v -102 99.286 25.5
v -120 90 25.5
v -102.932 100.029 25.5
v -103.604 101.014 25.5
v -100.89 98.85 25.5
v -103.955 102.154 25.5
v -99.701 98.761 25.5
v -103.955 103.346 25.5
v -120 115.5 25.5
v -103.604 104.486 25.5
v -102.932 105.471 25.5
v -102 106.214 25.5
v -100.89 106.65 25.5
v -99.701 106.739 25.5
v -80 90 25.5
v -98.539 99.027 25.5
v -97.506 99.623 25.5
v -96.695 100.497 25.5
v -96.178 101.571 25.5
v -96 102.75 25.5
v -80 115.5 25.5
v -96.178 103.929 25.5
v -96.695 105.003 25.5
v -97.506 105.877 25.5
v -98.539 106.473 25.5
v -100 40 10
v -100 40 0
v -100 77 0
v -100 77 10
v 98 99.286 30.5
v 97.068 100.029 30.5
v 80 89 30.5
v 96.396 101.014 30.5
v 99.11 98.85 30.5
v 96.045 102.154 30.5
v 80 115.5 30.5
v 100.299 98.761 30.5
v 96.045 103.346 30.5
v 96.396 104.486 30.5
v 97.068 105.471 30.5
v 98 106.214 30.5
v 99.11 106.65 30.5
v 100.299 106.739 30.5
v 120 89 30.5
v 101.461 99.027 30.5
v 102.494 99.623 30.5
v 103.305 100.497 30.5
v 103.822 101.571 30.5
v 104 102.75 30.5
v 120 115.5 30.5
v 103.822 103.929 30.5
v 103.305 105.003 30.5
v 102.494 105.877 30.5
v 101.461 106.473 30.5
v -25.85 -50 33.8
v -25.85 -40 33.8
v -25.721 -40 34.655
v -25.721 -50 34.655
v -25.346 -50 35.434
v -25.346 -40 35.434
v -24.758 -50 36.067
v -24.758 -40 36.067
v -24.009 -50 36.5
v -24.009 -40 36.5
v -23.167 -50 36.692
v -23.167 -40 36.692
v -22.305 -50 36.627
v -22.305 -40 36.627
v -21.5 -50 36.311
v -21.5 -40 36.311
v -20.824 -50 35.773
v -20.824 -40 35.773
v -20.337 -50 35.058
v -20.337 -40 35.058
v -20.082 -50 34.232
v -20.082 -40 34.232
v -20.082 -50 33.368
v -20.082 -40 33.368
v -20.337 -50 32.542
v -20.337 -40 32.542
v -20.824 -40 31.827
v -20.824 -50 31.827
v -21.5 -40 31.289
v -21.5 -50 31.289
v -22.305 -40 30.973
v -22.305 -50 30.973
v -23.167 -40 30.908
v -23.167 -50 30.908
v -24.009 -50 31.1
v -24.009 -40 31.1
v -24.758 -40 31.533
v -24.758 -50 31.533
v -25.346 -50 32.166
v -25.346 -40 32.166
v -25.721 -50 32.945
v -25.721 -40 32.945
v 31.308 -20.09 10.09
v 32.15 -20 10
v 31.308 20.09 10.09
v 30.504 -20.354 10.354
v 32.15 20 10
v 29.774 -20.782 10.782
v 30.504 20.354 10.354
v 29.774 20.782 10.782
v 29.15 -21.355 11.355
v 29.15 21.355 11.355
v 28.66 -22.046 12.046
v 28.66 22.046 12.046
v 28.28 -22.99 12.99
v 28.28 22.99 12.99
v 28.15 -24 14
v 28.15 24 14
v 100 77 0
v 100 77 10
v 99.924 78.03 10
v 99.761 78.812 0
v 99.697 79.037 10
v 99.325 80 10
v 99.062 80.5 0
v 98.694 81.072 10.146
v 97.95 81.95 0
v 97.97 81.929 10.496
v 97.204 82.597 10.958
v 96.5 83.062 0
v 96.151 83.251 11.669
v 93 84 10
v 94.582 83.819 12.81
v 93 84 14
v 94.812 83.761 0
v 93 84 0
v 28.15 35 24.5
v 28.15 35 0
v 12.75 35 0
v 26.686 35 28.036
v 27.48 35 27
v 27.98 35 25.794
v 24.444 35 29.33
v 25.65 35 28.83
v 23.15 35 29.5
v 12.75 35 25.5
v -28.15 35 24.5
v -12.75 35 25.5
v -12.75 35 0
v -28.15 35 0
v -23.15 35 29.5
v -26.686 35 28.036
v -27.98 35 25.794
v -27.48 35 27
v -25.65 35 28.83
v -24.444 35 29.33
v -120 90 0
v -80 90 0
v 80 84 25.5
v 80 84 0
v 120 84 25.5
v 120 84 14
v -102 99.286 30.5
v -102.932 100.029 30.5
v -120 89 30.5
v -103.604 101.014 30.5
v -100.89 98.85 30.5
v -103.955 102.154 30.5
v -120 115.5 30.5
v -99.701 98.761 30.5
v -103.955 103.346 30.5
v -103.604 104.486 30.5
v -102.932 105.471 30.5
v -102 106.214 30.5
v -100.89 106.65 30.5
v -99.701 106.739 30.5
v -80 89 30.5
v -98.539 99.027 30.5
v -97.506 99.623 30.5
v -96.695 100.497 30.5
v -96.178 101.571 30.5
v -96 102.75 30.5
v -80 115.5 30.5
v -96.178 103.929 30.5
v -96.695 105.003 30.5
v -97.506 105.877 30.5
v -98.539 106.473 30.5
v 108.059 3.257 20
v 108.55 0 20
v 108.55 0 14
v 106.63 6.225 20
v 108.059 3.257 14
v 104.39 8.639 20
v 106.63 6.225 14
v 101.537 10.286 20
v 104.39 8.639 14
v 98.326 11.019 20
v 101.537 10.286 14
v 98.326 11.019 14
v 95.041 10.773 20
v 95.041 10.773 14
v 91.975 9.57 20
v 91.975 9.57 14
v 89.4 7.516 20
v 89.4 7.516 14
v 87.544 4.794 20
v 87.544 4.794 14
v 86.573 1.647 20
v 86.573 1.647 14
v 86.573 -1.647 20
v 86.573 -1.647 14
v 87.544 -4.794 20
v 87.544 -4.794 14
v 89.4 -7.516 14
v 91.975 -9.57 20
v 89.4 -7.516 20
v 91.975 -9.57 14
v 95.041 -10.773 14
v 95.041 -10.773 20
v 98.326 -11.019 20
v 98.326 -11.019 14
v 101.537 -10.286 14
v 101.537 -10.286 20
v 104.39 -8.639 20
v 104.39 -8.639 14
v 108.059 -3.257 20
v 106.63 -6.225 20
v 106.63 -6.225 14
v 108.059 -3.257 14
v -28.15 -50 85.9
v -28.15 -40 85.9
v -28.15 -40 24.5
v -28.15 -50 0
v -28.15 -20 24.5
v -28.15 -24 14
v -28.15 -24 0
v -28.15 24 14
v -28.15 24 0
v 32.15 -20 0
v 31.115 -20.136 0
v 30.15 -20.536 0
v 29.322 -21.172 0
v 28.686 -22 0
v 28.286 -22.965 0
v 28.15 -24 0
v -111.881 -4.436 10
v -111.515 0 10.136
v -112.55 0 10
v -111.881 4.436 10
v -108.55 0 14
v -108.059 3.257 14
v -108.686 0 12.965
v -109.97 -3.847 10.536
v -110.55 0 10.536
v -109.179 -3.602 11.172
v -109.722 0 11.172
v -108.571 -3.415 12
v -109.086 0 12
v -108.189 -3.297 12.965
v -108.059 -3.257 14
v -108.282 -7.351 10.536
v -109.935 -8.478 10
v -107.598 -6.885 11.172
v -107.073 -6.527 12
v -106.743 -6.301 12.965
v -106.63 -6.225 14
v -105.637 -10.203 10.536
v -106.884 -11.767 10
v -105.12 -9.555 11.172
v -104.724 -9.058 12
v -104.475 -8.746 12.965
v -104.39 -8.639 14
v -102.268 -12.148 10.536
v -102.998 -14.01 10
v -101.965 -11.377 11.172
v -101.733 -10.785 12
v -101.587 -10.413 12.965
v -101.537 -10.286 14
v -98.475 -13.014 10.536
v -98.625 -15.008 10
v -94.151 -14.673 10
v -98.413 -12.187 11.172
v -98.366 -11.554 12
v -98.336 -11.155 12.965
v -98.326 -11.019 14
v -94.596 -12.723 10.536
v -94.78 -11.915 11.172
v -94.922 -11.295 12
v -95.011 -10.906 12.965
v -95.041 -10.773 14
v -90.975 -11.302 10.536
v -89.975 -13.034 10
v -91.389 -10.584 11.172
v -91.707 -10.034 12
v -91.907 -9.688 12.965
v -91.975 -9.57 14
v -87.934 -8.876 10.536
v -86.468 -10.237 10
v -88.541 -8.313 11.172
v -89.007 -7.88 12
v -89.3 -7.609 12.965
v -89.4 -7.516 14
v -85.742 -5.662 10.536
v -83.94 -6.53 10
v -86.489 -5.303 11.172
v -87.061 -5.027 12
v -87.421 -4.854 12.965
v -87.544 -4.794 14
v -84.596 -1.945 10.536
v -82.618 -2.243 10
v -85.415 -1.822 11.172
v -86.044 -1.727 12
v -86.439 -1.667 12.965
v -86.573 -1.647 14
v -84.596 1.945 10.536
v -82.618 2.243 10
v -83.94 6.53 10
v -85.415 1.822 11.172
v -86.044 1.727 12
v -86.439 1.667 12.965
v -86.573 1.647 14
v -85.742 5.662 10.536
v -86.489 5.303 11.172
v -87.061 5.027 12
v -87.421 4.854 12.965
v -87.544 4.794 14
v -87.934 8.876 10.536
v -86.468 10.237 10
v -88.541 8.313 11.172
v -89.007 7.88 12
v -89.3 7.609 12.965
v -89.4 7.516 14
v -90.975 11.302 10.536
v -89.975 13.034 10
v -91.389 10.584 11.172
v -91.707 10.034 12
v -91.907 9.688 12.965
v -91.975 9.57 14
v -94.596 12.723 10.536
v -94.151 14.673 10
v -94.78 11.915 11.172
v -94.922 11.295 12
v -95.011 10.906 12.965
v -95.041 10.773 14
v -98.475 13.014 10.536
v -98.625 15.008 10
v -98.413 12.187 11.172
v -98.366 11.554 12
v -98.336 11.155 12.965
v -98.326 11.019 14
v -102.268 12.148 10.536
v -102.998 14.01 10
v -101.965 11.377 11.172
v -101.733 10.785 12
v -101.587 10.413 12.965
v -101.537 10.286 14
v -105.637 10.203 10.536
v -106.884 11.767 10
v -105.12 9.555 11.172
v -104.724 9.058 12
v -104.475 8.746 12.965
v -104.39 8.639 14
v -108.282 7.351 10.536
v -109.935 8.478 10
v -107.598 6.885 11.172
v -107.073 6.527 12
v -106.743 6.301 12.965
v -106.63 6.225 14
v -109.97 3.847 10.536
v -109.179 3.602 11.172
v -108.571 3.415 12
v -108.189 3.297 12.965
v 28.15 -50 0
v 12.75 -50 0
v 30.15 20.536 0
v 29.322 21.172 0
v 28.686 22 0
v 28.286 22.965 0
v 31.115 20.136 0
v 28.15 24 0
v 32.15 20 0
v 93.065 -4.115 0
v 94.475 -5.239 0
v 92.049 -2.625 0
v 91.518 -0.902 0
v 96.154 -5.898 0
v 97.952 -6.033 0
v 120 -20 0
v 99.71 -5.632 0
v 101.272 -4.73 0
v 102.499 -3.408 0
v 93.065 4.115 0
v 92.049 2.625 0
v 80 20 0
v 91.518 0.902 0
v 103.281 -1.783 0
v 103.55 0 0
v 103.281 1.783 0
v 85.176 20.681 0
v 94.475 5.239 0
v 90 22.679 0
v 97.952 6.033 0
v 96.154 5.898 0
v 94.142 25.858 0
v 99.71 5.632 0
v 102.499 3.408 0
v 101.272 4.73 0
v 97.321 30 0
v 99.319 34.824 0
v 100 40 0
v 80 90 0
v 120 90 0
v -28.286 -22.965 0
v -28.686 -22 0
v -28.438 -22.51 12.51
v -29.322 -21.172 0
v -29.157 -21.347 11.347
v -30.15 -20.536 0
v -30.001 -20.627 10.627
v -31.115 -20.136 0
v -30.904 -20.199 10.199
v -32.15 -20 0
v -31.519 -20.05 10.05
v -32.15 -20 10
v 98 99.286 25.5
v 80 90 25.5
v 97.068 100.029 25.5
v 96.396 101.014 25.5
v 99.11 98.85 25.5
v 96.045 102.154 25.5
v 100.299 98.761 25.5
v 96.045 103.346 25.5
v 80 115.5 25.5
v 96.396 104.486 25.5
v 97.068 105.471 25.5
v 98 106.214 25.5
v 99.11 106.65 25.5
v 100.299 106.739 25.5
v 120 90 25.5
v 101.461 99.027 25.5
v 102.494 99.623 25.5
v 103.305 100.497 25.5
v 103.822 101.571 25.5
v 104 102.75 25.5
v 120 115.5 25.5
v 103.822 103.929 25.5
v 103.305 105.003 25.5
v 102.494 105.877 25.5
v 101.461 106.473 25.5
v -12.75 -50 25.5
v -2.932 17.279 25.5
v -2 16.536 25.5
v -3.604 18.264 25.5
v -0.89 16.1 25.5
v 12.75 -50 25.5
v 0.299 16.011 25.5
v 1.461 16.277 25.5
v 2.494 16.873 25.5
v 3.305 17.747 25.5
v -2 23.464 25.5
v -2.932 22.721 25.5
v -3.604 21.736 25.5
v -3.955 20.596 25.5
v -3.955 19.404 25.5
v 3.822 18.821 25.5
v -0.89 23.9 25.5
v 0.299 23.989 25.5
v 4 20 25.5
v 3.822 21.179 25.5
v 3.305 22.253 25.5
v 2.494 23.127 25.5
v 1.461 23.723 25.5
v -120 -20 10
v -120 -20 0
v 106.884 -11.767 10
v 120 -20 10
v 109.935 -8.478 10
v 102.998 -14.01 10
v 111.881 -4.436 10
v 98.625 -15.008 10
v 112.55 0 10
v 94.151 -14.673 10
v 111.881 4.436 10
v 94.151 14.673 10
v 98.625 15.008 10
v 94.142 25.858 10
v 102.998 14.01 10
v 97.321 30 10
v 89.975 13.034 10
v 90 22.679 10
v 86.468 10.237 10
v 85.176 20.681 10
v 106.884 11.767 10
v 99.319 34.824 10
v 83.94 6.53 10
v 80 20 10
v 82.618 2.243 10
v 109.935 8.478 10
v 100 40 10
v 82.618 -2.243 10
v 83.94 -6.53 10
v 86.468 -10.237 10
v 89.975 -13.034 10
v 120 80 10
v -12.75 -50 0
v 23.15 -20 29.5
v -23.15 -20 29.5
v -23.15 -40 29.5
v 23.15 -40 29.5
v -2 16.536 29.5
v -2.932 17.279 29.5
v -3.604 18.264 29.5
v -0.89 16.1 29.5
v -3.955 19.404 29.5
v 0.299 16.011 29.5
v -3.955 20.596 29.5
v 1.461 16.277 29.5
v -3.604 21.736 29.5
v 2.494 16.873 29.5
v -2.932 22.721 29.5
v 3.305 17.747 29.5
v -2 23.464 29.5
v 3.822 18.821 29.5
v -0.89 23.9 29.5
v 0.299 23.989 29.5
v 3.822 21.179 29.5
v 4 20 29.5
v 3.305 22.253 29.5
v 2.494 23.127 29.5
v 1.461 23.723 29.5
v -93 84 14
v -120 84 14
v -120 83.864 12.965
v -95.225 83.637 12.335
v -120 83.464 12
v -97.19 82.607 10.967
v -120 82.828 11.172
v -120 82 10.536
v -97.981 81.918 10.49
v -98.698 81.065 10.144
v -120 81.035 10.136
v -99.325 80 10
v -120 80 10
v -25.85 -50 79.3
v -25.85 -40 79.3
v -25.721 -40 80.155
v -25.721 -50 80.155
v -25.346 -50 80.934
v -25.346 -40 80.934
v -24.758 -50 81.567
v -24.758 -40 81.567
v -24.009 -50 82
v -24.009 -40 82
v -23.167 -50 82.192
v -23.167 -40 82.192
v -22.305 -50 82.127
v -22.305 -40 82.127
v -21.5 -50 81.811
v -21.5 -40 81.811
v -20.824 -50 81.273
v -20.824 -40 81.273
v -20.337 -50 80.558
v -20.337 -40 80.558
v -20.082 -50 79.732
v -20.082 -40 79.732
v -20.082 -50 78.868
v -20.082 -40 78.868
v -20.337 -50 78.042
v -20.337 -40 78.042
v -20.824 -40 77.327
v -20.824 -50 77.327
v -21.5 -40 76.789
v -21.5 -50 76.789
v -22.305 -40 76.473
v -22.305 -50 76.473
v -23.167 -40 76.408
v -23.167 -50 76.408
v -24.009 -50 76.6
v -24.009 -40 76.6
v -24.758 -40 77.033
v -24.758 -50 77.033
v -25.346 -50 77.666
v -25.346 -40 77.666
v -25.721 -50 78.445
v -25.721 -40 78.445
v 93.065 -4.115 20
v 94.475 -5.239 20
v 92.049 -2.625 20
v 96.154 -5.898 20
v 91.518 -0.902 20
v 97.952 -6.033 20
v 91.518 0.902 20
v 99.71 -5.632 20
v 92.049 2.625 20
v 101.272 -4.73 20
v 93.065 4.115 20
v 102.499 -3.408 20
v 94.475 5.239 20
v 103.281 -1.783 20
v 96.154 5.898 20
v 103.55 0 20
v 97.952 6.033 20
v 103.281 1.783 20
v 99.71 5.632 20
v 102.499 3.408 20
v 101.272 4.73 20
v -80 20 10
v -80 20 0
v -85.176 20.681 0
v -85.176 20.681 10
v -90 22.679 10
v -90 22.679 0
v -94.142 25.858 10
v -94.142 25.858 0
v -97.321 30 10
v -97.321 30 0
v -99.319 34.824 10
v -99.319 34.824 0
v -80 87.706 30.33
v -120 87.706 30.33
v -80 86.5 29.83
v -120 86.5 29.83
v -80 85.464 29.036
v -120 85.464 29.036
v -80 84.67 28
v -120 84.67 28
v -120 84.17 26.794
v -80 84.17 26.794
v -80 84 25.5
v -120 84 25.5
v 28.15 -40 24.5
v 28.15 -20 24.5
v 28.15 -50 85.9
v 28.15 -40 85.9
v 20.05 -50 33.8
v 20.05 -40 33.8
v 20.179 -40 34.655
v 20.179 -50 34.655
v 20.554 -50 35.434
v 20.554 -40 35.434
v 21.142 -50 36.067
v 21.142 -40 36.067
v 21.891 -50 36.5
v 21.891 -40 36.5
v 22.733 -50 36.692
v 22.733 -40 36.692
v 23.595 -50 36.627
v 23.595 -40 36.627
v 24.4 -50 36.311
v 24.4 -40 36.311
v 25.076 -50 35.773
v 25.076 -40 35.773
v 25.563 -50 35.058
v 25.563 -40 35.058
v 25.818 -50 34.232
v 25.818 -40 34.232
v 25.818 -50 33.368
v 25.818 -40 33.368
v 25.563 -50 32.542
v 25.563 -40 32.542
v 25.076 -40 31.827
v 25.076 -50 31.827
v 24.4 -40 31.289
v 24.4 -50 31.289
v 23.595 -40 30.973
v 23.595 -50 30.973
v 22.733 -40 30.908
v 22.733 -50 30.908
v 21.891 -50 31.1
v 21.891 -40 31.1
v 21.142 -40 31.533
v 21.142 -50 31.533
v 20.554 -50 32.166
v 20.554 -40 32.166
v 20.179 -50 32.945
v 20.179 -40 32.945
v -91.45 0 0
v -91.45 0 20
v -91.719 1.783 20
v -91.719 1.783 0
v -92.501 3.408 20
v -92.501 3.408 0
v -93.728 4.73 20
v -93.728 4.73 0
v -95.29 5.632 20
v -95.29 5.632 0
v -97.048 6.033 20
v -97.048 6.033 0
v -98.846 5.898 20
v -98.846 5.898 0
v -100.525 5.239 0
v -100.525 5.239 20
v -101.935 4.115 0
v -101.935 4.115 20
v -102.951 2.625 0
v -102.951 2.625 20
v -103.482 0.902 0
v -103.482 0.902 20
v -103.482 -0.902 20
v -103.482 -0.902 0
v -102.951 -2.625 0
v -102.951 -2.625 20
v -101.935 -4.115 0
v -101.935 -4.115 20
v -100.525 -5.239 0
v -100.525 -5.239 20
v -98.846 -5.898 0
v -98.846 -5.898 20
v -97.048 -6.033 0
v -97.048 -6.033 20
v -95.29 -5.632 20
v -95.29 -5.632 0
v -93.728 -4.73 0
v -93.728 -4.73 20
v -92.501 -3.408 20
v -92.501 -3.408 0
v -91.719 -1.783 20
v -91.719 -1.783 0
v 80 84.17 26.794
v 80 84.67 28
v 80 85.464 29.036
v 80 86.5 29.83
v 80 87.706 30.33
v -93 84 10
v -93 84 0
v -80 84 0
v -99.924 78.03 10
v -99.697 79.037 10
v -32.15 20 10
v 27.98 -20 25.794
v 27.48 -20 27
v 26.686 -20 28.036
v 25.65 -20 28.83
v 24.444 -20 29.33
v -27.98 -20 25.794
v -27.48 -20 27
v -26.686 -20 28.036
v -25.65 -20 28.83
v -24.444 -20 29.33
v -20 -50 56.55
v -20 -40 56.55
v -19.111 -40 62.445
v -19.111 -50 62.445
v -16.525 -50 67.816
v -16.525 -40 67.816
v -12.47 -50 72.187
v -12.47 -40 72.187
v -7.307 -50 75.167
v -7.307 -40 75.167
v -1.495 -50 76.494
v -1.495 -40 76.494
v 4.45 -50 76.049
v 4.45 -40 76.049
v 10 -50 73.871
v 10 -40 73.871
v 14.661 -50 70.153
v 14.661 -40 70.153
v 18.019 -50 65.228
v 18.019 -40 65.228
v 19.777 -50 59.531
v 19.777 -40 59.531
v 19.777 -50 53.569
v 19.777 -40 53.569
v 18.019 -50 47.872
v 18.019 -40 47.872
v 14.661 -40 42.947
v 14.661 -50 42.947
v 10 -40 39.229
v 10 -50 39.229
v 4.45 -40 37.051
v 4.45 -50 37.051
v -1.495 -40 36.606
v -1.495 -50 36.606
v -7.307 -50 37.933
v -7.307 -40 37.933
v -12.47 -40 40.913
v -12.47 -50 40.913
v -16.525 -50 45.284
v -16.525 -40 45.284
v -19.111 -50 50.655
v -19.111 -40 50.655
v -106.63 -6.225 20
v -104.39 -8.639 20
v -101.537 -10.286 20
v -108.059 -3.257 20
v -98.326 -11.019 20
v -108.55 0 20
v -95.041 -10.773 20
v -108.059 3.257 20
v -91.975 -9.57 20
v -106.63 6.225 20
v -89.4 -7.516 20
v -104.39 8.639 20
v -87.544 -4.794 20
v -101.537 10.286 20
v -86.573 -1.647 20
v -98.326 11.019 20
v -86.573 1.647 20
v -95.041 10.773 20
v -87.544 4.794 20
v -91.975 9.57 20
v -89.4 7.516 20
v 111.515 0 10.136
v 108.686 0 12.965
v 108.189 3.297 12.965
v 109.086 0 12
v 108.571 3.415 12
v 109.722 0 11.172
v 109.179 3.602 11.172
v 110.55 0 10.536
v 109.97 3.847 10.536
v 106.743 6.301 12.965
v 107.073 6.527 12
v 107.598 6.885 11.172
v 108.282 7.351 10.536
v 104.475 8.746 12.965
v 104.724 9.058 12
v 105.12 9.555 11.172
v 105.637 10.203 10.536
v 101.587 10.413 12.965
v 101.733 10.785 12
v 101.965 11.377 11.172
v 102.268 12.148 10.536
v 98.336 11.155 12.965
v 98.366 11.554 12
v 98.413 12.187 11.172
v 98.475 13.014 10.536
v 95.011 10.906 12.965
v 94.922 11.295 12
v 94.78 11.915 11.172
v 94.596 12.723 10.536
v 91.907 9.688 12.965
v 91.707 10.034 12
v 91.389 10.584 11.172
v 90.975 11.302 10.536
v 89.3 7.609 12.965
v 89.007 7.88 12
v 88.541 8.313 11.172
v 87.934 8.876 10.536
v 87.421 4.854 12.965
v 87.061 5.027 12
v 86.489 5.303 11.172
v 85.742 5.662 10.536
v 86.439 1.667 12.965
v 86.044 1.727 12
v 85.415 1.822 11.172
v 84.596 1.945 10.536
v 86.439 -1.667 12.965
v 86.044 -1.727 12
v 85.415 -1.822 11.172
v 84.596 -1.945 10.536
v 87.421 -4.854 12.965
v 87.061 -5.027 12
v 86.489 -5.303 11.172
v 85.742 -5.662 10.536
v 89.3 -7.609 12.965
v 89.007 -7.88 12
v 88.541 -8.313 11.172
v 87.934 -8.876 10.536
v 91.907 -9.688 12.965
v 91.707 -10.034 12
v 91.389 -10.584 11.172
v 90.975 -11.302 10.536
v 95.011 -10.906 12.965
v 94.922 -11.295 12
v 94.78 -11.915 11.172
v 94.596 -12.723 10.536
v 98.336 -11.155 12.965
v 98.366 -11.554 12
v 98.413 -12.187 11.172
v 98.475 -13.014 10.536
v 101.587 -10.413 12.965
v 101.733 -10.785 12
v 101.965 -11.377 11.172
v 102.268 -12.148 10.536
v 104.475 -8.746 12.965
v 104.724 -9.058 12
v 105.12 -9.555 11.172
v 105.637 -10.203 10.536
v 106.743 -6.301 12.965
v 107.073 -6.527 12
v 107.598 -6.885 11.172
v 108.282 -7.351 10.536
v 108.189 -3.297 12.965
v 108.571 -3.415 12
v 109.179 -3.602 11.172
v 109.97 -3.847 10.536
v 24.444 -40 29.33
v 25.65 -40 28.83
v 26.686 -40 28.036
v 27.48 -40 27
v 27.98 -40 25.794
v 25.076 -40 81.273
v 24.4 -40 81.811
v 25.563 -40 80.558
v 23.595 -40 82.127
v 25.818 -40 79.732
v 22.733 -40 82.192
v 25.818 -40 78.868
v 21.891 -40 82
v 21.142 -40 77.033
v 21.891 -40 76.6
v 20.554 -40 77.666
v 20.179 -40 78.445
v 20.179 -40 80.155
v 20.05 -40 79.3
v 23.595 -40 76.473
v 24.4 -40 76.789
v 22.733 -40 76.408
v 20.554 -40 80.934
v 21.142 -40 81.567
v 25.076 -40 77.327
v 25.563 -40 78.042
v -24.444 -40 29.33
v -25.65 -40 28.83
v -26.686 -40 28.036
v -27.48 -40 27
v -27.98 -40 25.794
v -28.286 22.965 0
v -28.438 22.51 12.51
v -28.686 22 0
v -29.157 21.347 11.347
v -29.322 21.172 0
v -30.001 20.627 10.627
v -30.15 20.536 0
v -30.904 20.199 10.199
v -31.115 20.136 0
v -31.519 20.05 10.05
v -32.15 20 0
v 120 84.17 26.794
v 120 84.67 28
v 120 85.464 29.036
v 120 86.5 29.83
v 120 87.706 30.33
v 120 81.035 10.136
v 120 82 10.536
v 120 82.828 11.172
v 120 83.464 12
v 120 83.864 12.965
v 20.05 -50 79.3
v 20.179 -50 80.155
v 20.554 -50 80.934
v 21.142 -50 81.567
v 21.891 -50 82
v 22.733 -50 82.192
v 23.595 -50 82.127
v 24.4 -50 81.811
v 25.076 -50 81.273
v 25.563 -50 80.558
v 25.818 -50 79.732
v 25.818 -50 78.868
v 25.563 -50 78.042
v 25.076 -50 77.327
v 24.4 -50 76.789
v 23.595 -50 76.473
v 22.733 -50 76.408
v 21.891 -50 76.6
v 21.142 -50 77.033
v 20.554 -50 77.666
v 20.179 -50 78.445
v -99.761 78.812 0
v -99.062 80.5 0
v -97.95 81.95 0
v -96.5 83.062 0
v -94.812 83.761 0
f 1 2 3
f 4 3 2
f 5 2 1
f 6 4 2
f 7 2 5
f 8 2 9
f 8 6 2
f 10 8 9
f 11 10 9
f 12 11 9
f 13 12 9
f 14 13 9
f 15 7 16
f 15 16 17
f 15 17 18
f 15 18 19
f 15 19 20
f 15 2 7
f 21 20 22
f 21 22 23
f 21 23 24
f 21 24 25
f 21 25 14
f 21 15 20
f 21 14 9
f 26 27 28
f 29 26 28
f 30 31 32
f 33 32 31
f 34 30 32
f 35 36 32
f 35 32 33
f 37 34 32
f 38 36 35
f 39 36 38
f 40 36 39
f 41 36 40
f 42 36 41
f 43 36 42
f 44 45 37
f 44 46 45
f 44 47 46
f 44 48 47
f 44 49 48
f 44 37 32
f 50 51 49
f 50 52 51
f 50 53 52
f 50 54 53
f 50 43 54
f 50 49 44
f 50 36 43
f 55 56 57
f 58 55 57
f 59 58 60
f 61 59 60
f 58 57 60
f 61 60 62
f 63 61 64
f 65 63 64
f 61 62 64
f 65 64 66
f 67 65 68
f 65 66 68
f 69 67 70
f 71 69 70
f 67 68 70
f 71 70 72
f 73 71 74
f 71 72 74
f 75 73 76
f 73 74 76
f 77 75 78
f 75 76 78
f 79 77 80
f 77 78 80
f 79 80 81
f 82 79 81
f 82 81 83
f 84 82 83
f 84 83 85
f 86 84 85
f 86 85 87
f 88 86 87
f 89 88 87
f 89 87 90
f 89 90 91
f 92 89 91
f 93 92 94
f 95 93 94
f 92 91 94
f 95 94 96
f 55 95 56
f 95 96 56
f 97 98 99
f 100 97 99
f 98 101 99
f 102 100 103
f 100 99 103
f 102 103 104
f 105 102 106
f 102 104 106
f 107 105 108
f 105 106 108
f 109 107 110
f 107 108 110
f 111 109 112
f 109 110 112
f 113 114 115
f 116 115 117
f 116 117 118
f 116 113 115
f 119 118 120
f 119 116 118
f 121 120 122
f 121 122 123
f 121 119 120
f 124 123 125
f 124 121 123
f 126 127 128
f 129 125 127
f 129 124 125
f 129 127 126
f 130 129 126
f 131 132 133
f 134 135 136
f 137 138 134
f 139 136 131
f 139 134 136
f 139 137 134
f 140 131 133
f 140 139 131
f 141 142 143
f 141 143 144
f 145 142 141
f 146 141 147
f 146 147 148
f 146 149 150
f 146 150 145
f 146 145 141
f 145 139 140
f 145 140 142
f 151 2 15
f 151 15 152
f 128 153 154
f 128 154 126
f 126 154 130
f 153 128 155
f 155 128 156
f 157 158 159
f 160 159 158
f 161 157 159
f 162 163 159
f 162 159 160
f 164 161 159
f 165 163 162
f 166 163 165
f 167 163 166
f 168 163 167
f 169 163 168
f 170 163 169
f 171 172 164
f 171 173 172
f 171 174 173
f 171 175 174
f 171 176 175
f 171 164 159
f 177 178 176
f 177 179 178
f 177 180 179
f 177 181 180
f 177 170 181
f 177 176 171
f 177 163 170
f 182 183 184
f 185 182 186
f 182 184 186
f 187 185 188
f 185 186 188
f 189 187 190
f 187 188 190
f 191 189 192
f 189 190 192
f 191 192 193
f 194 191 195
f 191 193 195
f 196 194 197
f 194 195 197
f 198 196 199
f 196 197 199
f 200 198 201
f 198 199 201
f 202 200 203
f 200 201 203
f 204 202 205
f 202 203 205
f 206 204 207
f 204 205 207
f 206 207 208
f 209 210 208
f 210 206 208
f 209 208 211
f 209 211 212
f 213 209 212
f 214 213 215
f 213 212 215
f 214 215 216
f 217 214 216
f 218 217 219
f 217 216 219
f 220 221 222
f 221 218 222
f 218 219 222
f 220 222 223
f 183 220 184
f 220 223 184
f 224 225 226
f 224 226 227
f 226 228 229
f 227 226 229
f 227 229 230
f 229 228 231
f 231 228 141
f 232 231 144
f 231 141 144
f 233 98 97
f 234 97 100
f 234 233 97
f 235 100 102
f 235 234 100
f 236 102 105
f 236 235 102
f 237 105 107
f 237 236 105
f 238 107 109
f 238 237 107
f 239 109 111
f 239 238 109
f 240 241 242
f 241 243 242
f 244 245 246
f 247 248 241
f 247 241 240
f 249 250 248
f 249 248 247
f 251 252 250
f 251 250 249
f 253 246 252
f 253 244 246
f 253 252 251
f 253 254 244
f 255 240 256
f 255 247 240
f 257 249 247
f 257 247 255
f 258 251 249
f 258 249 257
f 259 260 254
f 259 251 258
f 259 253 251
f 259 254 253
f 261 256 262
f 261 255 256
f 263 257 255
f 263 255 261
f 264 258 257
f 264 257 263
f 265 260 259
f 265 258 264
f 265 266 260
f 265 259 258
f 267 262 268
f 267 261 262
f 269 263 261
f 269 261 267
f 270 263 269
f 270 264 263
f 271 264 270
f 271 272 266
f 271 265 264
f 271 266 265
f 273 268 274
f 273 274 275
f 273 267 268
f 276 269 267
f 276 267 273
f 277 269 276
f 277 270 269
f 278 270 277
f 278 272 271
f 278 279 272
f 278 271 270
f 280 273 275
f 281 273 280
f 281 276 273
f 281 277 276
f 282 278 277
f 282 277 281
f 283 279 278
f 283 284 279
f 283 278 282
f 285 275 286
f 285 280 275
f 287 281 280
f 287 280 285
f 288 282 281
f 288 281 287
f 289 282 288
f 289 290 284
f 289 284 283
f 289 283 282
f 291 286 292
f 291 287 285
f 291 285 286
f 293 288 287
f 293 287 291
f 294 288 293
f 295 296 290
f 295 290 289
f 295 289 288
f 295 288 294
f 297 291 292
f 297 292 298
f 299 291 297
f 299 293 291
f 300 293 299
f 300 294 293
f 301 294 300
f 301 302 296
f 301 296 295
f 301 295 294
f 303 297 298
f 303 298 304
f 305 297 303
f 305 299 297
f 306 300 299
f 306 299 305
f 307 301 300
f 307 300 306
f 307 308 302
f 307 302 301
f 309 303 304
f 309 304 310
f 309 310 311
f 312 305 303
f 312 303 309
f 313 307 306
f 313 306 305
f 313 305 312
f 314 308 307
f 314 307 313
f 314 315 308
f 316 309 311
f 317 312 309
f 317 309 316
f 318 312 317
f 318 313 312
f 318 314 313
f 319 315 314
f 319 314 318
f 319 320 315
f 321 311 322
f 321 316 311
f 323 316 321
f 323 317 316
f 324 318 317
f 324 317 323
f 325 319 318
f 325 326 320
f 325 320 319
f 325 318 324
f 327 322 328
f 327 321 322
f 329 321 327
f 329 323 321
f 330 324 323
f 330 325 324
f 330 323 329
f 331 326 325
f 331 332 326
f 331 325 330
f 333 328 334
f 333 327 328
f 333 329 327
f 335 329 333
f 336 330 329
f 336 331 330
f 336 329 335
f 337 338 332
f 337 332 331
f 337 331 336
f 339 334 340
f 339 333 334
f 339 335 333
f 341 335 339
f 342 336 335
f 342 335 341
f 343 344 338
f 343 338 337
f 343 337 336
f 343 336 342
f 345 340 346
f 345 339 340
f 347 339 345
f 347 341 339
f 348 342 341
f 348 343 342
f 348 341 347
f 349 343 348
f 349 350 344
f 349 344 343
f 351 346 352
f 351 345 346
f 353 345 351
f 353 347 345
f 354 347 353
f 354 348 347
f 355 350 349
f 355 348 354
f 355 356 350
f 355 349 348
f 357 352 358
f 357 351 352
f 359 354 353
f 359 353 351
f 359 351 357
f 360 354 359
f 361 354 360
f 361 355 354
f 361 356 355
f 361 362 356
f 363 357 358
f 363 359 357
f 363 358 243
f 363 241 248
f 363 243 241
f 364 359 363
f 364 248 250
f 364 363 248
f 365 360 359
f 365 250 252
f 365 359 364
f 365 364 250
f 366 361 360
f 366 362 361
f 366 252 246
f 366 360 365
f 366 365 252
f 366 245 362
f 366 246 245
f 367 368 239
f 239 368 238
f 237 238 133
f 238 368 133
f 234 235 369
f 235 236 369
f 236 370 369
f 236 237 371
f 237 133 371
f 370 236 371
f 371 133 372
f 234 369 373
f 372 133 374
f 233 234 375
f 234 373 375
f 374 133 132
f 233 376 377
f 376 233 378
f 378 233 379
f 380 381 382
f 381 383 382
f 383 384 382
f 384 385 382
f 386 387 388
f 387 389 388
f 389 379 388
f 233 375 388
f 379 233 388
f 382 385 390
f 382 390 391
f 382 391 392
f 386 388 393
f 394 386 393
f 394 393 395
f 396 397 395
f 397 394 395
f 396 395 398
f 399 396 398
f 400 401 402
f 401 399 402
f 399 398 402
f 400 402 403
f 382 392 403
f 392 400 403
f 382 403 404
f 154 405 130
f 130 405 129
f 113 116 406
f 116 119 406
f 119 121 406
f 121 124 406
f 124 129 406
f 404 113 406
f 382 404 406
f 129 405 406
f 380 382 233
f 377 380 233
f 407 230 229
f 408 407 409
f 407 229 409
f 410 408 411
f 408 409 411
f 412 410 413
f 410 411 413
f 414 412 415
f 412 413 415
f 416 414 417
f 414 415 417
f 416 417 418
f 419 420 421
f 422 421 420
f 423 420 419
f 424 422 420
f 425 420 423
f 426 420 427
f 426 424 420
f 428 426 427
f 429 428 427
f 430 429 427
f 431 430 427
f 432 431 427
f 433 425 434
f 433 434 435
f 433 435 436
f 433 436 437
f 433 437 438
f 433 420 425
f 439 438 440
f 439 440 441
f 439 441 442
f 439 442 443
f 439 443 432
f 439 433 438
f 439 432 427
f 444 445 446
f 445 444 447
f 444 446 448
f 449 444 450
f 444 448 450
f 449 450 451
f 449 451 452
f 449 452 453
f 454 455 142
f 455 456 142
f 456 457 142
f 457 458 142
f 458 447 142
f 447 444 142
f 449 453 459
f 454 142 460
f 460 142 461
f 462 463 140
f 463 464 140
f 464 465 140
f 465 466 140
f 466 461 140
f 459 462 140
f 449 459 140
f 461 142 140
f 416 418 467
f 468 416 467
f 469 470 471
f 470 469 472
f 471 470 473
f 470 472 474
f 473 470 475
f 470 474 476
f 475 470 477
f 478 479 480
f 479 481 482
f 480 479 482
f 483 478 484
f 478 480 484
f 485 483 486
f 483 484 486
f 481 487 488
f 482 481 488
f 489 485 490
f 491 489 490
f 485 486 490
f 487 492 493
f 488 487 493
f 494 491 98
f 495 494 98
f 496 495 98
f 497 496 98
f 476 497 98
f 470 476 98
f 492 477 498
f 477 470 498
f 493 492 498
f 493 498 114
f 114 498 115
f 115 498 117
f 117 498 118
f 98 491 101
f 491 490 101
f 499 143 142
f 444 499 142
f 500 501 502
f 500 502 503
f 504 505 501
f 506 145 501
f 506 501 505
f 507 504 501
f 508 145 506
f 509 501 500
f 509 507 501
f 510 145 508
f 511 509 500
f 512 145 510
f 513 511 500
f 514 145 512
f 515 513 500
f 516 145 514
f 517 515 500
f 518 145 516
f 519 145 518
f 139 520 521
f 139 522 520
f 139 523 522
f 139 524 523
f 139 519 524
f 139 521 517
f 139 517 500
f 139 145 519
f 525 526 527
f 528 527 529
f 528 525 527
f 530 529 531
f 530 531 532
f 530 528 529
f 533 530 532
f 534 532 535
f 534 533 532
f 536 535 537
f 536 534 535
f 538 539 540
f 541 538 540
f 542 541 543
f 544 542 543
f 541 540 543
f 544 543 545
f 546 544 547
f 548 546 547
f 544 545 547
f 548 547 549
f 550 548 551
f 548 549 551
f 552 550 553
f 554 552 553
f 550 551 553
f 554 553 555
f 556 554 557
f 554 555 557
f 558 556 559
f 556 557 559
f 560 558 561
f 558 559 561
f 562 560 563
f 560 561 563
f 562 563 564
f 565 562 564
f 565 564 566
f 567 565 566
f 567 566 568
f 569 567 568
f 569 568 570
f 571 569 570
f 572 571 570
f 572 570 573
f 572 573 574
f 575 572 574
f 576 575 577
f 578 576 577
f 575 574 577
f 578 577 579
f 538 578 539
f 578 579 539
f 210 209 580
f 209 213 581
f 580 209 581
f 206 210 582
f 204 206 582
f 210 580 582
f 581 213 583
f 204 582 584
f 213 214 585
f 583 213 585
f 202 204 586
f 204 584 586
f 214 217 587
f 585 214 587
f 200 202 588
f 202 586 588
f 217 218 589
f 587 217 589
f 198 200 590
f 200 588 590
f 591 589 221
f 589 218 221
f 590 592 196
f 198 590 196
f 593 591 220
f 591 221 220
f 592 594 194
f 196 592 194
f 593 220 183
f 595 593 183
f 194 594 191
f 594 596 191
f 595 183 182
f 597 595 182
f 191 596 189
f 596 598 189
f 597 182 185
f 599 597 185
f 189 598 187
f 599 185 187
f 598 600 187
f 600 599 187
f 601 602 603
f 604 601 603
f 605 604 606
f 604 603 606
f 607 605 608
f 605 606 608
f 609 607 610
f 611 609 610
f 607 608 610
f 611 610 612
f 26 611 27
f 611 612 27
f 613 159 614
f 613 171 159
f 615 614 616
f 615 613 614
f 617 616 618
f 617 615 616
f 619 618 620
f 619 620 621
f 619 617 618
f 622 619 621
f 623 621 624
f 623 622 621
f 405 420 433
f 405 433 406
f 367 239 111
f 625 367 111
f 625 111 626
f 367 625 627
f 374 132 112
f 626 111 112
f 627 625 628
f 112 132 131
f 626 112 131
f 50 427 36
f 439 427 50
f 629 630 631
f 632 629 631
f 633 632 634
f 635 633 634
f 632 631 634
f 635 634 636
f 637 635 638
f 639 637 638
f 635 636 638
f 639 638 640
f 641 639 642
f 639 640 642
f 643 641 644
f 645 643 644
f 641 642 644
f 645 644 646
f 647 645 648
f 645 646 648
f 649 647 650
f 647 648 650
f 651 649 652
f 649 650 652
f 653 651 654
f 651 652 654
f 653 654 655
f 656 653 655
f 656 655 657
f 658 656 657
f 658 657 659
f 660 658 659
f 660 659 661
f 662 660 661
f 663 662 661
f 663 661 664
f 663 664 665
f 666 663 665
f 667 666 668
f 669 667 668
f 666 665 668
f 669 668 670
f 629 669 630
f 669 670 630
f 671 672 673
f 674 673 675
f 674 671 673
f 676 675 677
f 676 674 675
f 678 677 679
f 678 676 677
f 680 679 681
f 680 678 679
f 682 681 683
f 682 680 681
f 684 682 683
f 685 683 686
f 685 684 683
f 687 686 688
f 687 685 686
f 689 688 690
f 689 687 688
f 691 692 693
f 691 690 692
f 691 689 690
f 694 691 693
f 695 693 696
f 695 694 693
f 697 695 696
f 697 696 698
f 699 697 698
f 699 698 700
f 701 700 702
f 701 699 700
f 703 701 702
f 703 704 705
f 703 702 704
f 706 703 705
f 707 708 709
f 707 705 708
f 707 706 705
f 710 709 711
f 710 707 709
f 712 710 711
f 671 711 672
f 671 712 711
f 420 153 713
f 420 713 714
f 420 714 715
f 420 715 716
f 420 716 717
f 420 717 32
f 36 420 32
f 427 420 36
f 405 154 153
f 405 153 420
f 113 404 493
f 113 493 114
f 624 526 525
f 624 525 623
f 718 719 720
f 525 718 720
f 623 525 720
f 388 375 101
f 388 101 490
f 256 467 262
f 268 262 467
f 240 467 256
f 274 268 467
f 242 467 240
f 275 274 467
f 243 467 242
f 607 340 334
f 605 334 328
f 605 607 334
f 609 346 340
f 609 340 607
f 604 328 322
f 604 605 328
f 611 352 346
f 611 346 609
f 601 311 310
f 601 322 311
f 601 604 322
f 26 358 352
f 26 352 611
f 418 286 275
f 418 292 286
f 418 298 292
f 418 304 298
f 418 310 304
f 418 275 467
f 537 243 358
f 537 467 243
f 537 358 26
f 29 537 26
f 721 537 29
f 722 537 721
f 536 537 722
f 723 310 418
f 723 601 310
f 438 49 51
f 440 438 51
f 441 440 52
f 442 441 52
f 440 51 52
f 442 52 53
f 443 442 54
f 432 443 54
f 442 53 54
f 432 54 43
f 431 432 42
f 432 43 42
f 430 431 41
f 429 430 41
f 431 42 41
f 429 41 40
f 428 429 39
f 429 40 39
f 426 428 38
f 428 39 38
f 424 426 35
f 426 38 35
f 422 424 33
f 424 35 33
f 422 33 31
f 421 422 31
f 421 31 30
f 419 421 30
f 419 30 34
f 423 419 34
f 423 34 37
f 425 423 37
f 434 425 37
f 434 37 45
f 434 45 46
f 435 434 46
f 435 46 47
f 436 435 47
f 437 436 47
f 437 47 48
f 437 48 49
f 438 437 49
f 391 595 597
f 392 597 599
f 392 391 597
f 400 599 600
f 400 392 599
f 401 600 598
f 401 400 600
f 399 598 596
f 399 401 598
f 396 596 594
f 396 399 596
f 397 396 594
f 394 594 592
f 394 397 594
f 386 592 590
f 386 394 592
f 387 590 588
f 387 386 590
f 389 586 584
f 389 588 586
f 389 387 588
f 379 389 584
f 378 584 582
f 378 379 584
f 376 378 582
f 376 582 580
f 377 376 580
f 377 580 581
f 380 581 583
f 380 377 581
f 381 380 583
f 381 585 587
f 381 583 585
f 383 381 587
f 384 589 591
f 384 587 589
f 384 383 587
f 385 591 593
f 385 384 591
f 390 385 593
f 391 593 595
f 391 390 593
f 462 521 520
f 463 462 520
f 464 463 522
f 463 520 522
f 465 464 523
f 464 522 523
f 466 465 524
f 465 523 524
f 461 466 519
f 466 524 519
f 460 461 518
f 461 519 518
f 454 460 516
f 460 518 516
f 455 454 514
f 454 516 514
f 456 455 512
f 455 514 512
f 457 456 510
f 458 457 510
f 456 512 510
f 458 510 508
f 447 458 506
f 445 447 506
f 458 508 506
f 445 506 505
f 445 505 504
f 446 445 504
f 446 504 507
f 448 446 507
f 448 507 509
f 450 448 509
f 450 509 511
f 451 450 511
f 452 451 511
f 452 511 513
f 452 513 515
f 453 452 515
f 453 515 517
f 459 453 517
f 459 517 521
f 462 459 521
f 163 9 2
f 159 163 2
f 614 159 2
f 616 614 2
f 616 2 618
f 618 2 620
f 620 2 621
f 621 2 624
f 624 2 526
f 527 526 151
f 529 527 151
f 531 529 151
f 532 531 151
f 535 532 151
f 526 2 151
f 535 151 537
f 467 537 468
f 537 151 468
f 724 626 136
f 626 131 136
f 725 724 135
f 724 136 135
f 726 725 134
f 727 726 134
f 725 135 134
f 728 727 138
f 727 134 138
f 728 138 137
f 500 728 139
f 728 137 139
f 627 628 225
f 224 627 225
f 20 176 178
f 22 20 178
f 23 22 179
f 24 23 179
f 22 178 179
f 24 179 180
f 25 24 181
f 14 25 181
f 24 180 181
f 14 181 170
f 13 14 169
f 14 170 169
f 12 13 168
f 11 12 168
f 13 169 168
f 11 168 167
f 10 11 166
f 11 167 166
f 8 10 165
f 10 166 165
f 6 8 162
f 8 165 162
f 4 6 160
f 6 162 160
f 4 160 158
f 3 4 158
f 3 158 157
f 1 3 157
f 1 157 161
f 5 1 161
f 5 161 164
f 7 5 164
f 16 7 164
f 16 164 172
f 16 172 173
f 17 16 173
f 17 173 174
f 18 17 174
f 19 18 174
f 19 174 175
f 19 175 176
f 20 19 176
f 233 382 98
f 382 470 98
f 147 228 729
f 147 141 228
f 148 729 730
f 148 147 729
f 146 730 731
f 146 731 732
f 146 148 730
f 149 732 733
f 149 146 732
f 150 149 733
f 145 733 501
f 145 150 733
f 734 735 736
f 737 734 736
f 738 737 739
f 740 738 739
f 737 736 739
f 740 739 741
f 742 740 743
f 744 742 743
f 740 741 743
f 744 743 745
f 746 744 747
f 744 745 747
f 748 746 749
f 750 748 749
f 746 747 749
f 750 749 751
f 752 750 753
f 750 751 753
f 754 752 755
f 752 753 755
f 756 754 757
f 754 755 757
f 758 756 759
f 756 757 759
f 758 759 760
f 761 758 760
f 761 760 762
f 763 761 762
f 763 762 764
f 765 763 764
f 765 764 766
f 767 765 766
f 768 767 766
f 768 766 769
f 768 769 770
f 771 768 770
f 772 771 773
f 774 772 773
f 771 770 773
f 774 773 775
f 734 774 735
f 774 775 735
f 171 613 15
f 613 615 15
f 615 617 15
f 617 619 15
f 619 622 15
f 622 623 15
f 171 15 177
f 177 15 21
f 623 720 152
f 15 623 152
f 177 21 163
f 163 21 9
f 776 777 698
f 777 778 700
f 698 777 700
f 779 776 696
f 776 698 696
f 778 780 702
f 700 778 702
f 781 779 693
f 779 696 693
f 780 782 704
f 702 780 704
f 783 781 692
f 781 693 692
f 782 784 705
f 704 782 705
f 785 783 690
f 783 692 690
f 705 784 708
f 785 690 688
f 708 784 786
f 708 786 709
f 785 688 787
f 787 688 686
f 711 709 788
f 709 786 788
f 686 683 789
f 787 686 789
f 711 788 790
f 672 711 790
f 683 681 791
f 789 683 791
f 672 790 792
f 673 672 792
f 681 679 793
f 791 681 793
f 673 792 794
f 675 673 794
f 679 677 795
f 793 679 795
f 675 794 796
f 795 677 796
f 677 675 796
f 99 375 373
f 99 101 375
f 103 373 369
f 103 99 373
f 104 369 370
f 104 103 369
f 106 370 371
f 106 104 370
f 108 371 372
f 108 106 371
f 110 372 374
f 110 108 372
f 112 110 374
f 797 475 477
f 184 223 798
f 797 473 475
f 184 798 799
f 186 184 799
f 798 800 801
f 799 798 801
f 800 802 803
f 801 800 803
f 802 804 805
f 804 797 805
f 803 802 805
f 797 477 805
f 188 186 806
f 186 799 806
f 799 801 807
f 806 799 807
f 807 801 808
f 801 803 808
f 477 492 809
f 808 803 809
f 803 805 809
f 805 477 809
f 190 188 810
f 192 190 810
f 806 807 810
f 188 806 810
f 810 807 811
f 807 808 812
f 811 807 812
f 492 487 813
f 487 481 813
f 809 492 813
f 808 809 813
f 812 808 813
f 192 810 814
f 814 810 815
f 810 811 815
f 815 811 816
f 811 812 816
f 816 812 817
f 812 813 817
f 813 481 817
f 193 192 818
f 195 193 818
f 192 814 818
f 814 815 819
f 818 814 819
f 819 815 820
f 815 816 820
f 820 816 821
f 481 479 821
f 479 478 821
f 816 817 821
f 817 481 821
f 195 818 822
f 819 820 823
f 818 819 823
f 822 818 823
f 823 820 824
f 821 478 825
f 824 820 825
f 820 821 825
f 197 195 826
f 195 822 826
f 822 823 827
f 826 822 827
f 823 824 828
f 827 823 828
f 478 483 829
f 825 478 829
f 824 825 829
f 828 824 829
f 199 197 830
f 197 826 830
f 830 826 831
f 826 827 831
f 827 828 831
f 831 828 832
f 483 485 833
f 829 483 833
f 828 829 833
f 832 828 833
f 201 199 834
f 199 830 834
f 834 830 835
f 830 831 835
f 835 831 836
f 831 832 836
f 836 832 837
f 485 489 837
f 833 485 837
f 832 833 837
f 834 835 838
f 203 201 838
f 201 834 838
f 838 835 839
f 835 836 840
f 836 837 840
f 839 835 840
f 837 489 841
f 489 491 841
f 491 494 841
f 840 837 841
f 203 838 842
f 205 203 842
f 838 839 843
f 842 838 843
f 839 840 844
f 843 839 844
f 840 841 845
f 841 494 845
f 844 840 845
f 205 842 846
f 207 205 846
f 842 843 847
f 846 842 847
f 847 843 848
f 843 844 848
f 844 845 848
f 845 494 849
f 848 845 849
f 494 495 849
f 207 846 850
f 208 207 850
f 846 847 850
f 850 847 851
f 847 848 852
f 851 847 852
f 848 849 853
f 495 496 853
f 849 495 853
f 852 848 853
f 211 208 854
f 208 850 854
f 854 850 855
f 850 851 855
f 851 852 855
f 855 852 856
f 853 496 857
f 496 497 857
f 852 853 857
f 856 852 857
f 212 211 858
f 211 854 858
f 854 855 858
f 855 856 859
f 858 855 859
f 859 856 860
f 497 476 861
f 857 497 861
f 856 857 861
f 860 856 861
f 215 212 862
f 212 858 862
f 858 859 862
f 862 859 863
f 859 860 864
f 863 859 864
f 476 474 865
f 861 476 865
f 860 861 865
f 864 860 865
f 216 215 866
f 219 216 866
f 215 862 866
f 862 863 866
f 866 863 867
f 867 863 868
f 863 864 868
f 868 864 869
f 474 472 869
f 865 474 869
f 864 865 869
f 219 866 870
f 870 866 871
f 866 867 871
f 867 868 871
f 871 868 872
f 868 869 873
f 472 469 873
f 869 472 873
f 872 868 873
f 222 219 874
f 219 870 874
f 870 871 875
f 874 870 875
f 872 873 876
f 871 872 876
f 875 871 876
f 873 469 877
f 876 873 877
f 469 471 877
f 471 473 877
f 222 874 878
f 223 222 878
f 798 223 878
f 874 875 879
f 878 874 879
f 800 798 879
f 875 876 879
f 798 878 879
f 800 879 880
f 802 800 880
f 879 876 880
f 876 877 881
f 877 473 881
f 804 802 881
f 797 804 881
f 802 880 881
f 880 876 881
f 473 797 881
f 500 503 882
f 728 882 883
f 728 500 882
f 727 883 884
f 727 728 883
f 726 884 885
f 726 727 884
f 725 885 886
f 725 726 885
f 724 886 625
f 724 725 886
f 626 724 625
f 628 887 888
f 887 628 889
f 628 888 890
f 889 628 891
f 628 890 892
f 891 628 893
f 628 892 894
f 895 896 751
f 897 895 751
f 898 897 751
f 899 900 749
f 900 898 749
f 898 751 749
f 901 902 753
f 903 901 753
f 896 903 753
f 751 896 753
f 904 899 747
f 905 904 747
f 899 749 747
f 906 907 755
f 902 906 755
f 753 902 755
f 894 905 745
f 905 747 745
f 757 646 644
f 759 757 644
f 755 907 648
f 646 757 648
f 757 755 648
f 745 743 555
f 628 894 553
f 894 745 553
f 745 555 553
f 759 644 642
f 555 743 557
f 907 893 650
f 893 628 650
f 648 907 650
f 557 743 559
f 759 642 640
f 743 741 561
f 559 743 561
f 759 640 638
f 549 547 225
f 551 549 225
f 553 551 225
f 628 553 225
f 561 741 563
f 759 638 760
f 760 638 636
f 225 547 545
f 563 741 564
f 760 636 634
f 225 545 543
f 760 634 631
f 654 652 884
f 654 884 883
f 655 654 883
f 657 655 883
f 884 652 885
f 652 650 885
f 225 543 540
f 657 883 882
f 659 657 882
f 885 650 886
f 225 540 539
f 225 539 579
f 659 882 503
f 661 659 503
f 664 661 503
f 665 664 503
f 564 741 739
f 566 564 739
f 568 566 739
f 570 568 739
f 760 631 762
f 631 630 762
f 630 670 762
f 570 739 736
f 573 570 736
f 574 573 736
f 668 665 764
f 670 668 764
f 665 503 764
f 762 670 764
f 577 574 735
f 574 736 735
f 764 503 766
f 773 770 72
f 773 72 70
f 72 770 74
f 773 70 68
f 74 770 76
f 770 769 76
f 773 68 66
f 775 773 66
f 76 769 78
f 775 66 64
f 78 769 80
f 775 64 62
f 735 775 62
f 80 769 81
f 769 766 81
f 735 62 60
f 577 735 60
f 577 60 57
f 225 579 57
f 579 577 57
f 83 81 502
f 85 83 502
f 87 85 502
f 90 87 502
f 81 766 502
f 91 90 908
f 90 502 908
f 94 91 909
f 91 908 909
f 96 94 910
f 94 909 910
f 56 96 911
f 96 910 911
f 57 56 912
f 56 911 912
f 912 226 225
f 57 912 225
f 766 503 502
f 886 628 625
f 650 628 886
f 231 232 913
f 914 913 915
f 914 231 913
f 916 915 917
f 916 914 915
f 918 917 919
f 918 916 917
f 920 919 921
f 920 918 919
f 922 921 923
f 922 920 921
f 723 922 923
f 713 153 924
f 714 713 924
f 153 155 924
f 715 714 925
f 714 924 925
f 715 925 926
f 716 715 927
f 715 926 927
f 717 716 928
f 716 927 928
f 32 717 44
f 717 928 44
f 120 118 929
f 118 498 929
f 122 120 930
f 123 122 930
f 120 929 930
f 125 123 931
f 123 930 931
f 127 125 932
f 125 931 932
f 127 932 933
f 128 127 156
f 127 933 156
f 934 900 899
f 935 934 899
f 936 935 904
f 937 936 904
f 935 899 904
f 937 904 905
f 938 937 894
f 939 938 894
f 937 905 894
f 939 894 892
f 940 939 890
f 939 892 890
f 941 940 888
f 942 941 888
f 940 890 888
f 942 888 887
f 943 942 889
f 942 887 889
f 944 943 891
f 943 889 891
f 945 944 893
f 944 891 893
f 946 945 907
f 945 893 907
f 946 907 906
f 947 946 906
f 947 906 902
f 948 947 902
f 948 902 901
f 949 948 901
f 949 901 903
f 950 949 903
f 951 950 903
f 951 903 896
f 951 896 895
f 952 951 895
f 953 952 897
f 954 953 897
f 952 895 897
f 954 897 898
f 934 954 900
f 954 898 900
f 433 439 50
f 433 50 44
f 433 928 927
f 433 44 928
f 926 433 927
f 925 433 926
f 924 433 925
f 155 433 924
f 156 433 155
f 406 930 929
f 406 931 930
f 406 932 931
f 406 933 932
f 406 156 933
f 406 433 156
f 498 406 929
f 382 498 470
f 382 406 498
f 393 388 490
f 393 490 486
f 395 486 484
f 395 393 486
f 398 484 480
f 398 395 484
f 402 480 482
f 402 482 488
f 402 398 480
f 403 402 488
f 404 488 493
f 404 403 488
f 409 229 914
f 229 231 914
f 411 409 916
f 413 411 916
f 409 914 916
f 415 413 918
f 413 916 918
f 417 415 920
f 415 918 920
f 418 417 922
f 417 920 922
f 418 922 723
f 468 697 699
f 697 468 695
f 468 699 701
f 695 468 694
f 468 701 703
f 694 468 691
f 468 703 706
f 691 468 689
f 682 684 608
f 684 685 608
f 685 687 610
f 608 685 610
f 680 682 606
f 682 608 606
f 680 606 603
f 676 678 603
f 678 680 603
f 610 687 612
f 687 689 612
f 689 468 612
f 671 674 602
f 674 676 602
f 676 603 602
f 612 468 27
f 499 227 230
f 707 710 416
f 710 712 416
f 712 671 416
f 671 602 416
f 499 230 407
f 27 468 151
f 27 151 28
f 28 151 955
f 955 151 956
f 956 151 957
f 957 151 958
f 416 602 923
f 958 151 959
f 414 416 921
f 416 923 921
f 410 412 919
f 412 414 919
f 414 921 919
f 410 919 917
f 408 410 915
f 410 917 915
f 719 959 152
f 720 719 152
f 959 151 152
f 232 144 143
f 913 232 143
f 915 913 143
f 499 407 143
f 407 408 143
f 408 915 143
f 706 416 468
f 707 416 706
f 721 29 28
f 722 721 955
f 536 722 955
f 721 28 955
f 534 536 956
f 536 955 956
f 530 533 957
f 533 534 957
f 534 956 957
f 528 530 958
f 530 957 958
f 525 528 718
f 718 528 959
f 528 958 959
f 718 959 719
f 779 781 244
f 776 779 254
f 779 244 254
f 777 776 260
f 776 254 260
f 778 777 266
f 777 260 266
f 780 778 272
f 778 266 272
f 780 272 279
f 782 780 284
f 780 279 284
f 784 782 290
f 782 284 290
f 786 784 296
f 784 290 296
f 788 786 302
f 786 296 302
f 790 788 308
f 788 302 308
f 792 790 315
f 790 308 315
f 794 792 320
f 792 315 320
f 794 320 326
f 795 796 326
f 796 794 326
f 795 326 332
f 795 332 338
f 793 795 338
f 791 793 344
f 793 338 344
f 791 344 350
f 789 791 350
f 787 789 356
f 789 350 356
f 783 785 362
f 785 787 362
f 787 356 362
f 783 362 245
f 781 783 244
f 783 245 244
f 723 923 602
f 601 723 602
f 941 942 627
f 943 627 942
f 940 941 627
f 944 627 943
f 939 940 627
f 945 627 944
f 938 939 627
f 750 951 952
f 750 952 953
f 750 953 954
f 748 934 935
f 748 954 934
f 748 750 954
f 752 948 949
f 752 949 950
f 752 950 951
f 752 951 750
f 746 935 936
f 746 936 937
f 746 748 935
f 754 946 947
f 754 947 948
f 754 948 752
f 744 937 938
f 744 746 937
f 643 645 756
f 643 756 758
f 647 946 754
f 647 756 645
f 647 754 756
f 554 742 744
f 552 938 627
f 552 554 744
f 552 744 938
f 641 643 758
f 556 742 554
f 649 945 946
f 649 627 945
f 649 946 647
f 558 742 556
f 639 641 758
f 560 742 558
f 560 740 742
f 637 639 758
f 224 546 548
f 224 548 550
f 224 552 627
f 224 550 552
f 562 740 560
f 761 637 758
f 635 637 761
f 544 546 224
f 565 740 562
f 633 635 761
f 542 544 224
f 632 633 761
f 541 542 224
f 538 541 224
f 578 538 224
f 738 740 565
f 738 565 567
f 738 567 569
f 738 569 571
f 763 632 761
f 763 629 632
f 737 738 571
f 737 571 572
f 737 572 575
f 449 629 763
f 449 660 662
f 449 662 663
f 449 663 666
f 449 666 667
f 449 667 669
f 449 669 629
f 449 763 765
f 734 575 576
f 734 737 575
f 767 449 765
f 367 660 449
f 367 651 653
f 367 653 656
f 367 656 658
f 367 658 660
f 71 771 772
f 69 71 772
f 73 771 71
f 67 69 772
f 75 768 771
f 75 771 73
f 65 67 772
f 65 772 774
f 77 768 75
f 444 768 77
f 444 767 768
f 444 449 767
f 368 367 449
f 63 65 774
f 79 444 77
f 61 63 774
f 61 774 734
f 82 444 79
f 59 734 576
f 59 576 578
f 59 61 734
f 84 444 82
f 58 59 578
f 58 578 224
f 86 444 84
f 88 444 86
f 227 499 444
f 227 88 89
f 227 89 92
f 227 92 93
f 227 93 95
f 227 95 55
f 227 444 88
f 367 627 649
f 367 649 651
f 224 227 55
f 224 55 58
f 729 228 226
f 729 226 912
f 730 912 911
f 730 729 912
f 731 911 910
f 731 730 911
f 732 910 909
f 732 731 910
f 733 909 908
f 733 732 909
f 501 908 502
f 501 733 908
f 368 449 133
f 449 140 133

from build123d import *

# Parameters (mm, degrees)
SKETCH19_R             = 6.05
BOSS_EXTRUDE12_DEPTH   = 10
BOSS_EXTRUDE12_2_DEPTH = 10
SKETCH20_R             = 11.05
SKETCH20_R_2           = 6.05
SKETCH20_W             = 40
SKETCH20_H             = 31.5
BOSS_EXTRUDE13_DEPTH   = 20.5
SKETCH21_W             = 25.5
SKETCH21_H             = 25.5
SKETCH21_W_2           = 10.5
SKETCH21_H_2           = 22.1
CUT_EXTRUDE11_DEPTH    = 269.086739694
CUT_EXTRUDE12_REACH    = 171.324
SKETCH22_R             = 4
BOSS_EXTRUDE14_DEPTH   = 55
FILLET6_R              = 5
BOSS_EXTRUDE16_DEPTH   = 20
SKETCH27_R             = 2.9
SKETCH27_R_2           = 20
BOSS_EXTRUDE15_DEPTH   = 10
FILLET10_R             = 4
SKETCH31_R             = 4
CUT_EXTRUDE13_DEPTH    = 10


with BuildPart() as part:
    # Sketch19 → Boss-Extrude12 (new body)
    with BuildSketch(Plane.XY):
        with BuildLine():
            Line((28.15, 20), (80, 20))
            ThreePointArc((80, 20), (94.142135624, 25.857864376), (100, 40))
            Line((100, 40), (100, 77))
            ThreePointArc((100, 77), (97.949747468, 81.949747468), (93, 84))
            Line((93, 84), (80, 84))
            Line((80, 84), (80, 115.5))
            Line((80, 115.5), (120, 115.5))
            Line((120, 115.5), (120, -20))
            Line((120, -20), (12.75, -20))
            Line((12.75, -20), (12.75, 20))
            Line((12.75, 20), (12.75, 35))
            Line((12.75, 35), (28.15, 35))
            Line((28.15, 35), (28.15, 20))
        make_face()
        with Locations((97.5, 0)):
            Circle(SKETCH19_R, mode=Mode.SUBTRACT)
    extrude(amount=BOSS_EXTRUDE12_DEPTH)



with BuildPart() as body_2:
    # Sketch19 → Boss-Extrude12 2 (new body)
    with BuildSketch(Plane.XY):
        with BuildLine():
            Line((-120, -20), (-12.75, -20))
            Line((-12.75, -20), (-12.75, 20))
            Line((-12.75, 20), (-12.75, 35))
            Line((-12.75, 35), (-28.15, 35))
            Line((-28.15, 35), (-28.15, 20))
            Line((-28.15, 20), (-80, 20))
            ThreePointArc((-80, 20), (-94.142135624, 25.857864376), (-100, 40))
            Line((-100, 40), (-100, 77))
            ThreePointArc((-100, 77), (-97.949747468, 81.949747468), (-93, 84))
            Line((-93, 84), (-80, 84))
            Line((-80, 84), (-80, 115.5))
            Line((-80, 115.5), (-120, 115.5))
            Line((-120, 115.5), (-120, -20))
        make_face()
        with Locations((-97.5, 0)):
            Circle(SKETCH19_R, mode=Mode.SUBTRACT)
    extrude(amount=BOSS_EXTRUDE12_2_DEPTH)


with BuildPart() as part_1:
    add(part.part)

    add(body_2.part)  # Boss-Extrude13 merges body 2
    # Sketch20 → Boss-Extrude13 (add)
    # profile 1 of 4: a face of its own
    with BuildSketch(Plane.XY.offset(10)):
        with Locations((-97.5, 0)):
            Circle(SKETCH20_R)
        with Locations((-97.5, 0)):
            Circle(SKETCH20_R_2, mode=Mode.SUBTRACT)
    # profile 2 of 4: a face of its own
    with BuildSketch(Plane.XY.offset(10)):
        with Locations((97.5, 0)):
            Circle(SKETCH20_R)
        with Locations((97.5, 0)):
            Circle(SKETCH20_R_2, mode=Mode.SUBTRACT)
    # profile 3 of 4: a face of its own
    with BuildSketch(Plane.XY.offset(10)):
        with Locations((-100, 99.75)):
            Rectangle(SKETCH20_W, SKETCH20_H)
    # profile 4 of 4: a face of its own
    with BuildSketch(Plane.XY.offset(10)):
        with Locations((100, 99.75)):
            Rectangle(SKETCH20_W, SKETCH20_H)
    extrude(amount=BOSS_EXTRUDE13_DEPTH)

    # Sketch21 → Cut-Extrude11 (cut, through all)
    with BuildSketch(Plane(origin=(120, 0, 0), x_dir=(0, 0, -1), z_dir=(1, 0, 0))):
        with Locations((-12.75, 102.75)):
            Rectangle(SKETCH21_W, SKETCH21_H)
        with Locations((-25.25, 0)):
            Rectangle(SKETCH21_W_2, SKETCH21_H_2)
    extrude(amount=-CUT_EXTRUDE11_DEPTH, mode=Mode.SUBTRACT)

    # Sketch22 → Cut-Extrude12 (cut, up to next)
    with BuildSketch(Plane.XY.offset(30.5), mode=Mode.PRIVATE) as cut_extrude12_sk1:
        with Locations((-100, 102.75)):
            Circle(SKETCH22_R)
    cut_extrude12_tool1 = extrude(cut_extrude12_sk1.sketch, amount=-CUT_EXTRUDE12_REACH, mode=Mode.PRIVATE) & part_1.part
    # Sketch22 → Cut-Extrude12 (cut, up to next)
    with BuildSketch(Plane.XY.offset(30.5), mode=Mode.PRIVATE) as cut_extrude12_sk2:
        with Locations((100, 102.75)):
            Circle(SKETCH22_R)
    cut_extrude12_tool2 = extrude(cut_extrude12_sk2.sketch, amount=-CUT_EXTRUDE12_REACH, mode=Mode.PRIVATE) & part_1.part
    add(cut_extrude12_tool1.solids().sort_by_distance((-100, 102.75, 30.5))[0], mode=Mode.SUBTRACT)
    add(cut_extrude12_tool2.solids().sort_by_distance((100, 102.75, 30.5))[0], mode=Mode.SUBTRACT)

    # Sketch23 → Boss-Extrude14 (add)
    with BuildSketch(Plane.XZ.offset(20)):
        Polygon((-12.75, 10), (-28.15, 10), (-28.15, 29.5), (28.15, 29.5), (28.15, 10), (12.75, 10), (12.75, 25.5), (-12.75, 25.5), align=None)
    extrude(amount=-BOSS_EXTRUDE14_DEPTH)

    # Fillet6
    fillet6_edges = [part_1.edges().sort_by_distance(p)[0] for p in [
        (-100, 84, 30.5),
        (100, 84, 30.5),
        (28.15, 7.5, 29.5),
        (-28.15, 7.5, 29.5),
    ]]
    fillet(fillet6_edges, radius=FILLET6_R)

    # Sketch28 → Boss-Extrude16 (add)
    with BuildSketch(Plane.XZ.offset(20)):
        with BuildLine():
            Line((-28.15, 0), (-28.15, 24.5))
            ThreePointArc((-28.15, 24.5), (-26.685533906, 28.035533906), (-23.15, 29.5))
            Line((-23.15, 29.5), (23.15, 29.5))
            ThreePointArc((23.15, 29.5), (26.685533906, 28.035533906), (28.15, 24.5))
            Line((28.15, 24.5), (28.15, 0))
            Line((28.15, 0), (12.75, 0))
            Line((12.75, 0), (12.75, 25.5))
            Line((12.75, 25.5), (-12.75, 25.5))
            Line((-12.75, 25.5), (-12.75, 0))
            Line((-12.75, 0), (-28.15, 0))
        make_face()
    extrude(amount=BOSS_EXTRUDE16_DEPTH)

    # Sketch27 → Boss-Extrude15 (add)
    with BuildSketch(Plane(origin=(0, -40, 0), x_dir=(1, 0, 0), z_dir=(0, 1, 0))):
        Polygon((-12.75, 0), (-12.75, -25.5), (12.75, -25.5), (12.75, 0), (28.15, 0), (28.15, -85.9), (-28.15, -85.9), (-28.15, 0), align=None)
        with Locations((-22.95, -79.3)):
            Circle(SKETCH27_R, mode=Mode.SUBTRACT)
        with Locations((22.95, -79.3)):
            Circle(SKETCH27_R, mode=Mode.SUBTRACT)
        with Locations((22.95, -33.8)):
            Circle(SKETCH27_R, mode=Mode.SUBTRACT)
        with Locations((-22.95, -33.8)):
            Circle(SKETCH27_R, mode=Mode.SUBTRACT)
        with Locations((0, -56.55)):
            Circle(SKETCH27_R_2, mode=Mode.SUBTRACT)
    extrude(amount=-BOSS_EXTRUDE15_DEPTH)

    # Fillet10
    fillet10_edges = [part_1.edges().sort_by_distance(p)[0] for p in [
        (28.15, 20, 5),
        (-28.15, 20, 5),
        (-28.15, 0, 10),
        (28.15, 0, 10),
        (86.45, 0, 10),
        (-108.55, 0, 10),
        (-106.5, 84, 10),
        (106.5, 84, 10),
        (-28.15, -20, 5),
        (28.15, -20, 5),
    ]]
    fillet(fillet10_edges, radius=FILLET10_R)

    # Sketch31 → Cut-Extrude13 (cut)
    with BuildSketch(Plane.XY.offset(29.5)):
        with Locations((0, 20)):
            Circle(SKETCH31_R)
    extrude(amount=-CUT_EXTRUDE13_DEPTH, mode=Mode.SUBTRACT)


solid = part_1.part
